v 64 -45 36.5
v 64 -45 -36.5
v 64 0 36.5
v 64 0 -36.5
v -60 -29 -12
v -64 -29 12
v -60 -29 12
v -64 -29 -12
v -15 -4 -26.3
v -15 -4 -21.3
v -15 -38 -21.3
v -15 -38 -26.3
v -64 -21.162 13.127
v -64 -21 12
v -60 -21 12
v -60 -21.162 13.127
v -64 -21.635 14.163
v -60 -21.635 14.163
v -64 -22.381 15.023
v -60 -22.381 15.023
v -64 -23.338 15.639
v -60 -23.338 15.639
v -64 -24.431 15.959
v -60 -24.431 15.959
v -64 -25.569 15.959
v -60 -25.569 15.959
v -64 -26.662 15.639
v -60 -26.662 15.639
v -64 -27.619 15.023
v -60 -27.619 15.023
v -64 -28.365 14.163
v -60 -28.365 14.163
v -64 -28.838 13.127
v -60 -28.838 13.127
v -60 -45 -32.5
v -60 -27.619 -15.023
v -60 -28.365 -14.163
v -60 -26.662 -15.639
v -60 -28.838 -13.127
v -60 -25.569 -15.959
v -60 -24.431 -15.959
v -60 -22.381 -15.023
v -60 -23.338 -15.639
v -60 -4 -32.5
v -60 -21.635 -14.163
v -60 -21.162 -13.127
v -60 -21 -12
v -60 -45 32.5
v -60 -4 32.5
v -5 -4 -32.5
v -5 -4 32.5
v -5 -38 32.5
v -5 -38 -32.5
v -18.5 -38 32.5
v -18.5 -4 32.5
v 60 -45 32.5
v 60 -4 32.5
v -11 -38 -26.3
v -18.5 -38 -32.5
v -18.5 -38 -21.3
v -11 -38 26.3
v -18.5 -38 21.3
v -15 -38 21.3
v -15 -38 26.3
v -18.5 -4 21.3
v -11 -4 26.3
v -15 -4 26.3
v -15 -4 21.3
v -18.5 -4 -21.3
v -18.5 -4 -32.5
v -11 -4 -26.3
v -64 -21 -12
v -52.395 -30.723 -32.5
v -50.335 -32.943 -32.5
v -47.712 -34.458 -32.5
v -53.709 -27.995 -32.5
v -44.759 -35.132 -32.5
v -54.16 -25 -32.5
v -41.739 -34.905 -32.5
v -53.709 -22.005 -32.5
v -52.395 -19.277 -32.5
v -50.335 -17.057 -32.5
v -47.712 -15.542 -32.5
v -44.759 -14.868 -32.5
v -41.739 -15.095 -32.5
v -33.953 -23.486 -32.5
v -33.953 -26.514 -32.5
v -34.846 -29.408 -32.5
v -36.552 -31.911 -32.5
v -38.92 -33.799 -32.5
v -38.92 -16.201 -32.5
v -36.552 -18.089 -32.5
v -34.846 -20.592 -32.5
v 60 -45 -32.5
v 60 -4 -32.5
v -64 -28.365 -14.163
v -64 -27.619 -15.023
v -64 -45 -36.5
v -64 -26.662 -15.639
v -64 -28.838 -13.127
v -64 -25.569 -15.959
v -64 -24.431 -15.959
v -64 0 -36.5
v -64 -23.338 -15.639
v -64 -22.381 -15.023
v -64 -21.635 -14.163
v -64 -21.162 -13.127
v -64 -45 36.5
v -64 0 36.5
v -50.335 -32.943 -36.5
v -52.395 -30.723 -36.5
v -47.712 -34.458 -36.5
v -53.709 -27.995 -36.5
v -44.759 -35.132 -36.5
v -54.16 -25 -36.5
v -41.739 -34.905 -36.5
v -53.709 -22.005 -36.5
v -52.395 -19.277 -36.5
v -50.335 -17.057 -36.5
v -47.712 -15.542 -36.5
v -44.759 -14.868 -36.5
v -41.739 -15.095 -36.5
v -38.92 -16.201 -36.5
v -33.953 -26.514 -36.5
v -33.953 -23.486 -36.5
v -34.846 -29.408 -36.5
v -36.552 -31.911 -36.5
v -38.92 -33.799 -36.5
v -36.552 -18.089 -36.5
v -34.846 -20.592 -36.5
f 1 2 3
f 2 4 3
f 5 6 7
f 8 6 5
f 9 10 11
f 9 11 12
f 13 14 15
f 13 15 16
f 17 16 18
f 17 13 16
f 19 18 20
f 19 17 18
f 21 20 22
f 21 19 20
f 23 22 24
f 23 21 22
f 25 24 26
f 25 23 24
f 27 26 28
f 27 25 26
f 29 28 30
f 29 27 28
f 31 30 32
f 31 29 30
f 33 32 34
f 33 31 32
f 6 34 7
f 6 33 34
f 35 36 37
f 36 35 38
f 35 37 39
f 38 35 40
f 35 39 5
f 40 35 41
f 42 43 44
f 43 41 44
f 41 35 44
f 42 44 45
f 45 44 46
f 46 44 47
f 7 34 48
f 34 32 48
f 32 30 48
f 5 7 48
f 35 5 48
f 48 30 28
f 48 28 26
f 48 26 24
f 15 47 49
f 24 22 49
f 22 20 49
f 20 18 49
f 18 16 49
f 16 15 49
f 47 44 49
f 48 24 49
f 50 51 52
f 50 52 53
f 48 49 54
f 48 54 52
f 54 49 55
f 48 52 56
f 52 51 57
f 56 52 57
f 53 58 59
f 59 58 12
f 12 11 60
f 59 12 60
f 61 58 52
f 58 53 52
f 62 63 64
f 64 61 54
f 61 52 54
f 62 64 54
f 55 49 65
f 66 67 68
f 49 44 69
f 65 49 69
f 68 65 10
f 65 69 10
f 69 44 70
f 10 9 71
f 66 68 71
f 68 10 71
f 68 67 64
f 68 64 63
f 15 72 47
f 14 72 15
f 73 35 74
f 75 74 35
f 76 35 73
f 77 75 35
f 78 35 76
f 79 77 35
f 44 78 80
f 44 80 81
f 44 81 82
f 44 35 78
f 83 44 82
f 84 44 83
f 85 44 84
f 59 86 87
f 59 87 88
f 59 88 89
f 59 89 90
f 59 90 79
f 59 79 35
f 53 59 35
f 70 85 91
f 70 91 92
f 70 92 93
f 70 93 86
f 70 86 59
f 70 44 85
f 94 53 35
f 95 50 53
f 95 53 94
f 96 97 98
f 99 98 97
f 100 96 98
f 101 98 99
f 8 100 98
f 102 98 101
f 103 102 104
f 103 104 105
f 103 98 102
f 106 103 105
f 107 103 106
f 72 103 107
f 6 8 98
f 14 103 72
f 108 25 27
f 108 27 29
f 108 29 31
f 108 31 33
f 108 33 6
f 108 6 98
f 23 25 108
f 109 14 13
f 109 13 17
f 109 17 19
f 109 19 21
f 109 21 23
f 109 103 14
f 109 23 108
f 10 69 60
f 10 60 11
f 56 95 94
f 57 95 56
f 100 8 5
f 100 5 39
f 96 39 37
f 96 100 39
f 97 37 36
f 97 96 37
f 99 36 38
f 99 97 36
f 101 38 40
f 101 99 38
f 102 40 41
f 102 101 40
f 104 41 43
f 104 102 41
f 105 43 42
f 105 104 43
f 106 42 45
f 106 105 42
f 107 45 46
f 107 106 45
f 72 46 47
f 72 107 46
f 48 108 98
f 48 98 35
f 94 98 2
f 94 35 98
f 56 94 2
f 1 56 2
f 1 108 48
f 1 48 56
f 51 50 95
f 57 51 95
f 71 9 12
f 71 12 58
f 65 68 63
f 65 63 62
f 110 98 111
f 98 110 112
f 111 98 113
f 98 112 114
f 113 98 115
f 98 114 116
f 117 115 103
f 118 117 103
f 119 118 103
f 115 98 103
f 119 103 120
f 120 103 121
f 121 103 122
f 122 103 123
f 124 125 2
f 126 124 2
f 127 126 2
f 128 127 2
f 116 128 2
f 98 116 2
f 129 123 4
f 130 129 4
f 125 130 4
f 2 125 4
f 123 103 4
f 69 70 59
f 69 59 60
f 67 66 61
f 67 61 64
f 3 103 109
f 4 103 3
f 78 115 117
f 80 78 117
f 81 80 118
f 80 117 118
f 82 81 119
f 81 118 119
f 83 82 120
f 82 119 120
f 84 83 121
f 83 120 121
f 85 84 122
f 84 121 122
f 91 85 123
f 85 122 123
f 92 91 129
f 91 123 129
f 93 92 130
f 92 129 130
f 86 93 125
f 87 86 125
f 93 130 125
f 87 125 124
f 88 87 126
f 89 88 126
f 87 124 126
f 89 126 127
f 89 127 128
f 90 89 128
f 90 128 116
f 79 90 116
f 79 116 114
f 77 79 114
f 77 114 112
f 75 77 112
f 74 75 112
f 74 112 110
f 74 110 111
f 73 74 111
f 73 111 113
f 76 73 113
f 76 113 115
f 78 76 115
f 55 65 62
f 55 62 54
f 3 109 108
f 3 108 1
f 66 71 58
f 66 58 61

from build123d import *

# Parameters (mm, degrees)
SKETCH6_W           = 128
SKETCH6_H           = 73
BOSS_EXTRUDE1_DEPTH = 4
SKETCH7_W           = 128
SKETCH7_H           = 73
SKETCH7_W_2         = 120
SKETCH7_H_2         = 65
BOSS_EXTRUDE2_DEPTH = 41
BOSS_EXTRUDE4_DEPTH = 34
CUT_EXTRUDE1_REACH  = 75
SKETCH10_R          = 10.16
CUT_EXTRUDE2_REACH  = 130


with BuildPart() as part:
    # Sketch6 → Boss-Extrude1 (new body)
    with BuildSketch(Plane(origin=(0, 0, 0), x_dir=(1, 0, 0), z_dir=(0, 1, 0))):
        Rectangle(SKETCH6_W, SKETCH6_H)
    extrude(amount=-BOSS_EXTRUDE1_DEPTH)

    # Sketch7 → Boss-Extrude2 (add)
    with BuildSketch(Plane.XZ.offset(4)):
        Rectangle(SKETCH7_W, SKETCH7_H)
        Rectangle(SKETCH7_W_2, SKETCH7_H_2, mode=Mode.SUBTRACT)
    extrude(amount=BOSS_EXTRUDE2_DEPTH)

    # Sketch9 → Boss-Extrude4 (add)
    with BuildSketch(Plane.XZ.offset(4)):
        Polygon((-5, 32.5), (-5, -32.5), (-18.5, -32.5), (-18.5, -21.3), (-15, -21.3), (-15, -26.3), (-11, -26.3), (-11, 26.3), (-15, 26.3), (-15, 21.3), (-18.5, 21.3), (-18.5, 32.5), align=None)
    extrude(amount=BOSS_EXTRUDE4_DEPTH)

    # Sketch10 → Cut-Extrude1 (cut, up to next)
    with BuildSketch(Plane(origin=(0, 0, -36.5), x_dir=(-1, 0, 0), z_dir=(0, 0, -1)), mode=Mode.PRIVATE) as cut_extrude1_sk1:
        with Locations((44, -25)):
            Circle(SKETCH10_R)
    cut_extrude1_tool1 = extrude(cut_extrude1_sk1.sketch, amount=-CUT_EXTRUDE1_REACH, mode=Mode.PRIVATE) & part.part
    add(cut_extrude1_tool1.solids().sort_by_distance((-44, -25, -36.5))[0], mode=Mode.SUBTRACT)

    # Sketch13 → Cut-Extrude2 (cut, up to next)
    with BuildSketch(Plane.ZY.offset(64), mode=Mode.PRIVATE) as cut_extrude2_sk1:
        with BuildLine():
            Line((-12, -21), (12, -21))
            ThreePointArc((12, -21), (16, -25), (12, -29))
            Line((12, -29), (-12, -29))
            ThreePointArc((-12, -29), (-16, -25), (-12, -21))
        make_face()
    cut_extrude2_tool1 = extrude(cut_extrude2_sk1.sketch, amount=-CUT_EXTRUDE2_REACH, mode=Mode.PRIVATE) & part.part
    add(cut_extrude2_tool1.solids().sort_by_distance((-64, -25, 0))[0], mode=Mode.SUBTRACT)


solid = part.part
